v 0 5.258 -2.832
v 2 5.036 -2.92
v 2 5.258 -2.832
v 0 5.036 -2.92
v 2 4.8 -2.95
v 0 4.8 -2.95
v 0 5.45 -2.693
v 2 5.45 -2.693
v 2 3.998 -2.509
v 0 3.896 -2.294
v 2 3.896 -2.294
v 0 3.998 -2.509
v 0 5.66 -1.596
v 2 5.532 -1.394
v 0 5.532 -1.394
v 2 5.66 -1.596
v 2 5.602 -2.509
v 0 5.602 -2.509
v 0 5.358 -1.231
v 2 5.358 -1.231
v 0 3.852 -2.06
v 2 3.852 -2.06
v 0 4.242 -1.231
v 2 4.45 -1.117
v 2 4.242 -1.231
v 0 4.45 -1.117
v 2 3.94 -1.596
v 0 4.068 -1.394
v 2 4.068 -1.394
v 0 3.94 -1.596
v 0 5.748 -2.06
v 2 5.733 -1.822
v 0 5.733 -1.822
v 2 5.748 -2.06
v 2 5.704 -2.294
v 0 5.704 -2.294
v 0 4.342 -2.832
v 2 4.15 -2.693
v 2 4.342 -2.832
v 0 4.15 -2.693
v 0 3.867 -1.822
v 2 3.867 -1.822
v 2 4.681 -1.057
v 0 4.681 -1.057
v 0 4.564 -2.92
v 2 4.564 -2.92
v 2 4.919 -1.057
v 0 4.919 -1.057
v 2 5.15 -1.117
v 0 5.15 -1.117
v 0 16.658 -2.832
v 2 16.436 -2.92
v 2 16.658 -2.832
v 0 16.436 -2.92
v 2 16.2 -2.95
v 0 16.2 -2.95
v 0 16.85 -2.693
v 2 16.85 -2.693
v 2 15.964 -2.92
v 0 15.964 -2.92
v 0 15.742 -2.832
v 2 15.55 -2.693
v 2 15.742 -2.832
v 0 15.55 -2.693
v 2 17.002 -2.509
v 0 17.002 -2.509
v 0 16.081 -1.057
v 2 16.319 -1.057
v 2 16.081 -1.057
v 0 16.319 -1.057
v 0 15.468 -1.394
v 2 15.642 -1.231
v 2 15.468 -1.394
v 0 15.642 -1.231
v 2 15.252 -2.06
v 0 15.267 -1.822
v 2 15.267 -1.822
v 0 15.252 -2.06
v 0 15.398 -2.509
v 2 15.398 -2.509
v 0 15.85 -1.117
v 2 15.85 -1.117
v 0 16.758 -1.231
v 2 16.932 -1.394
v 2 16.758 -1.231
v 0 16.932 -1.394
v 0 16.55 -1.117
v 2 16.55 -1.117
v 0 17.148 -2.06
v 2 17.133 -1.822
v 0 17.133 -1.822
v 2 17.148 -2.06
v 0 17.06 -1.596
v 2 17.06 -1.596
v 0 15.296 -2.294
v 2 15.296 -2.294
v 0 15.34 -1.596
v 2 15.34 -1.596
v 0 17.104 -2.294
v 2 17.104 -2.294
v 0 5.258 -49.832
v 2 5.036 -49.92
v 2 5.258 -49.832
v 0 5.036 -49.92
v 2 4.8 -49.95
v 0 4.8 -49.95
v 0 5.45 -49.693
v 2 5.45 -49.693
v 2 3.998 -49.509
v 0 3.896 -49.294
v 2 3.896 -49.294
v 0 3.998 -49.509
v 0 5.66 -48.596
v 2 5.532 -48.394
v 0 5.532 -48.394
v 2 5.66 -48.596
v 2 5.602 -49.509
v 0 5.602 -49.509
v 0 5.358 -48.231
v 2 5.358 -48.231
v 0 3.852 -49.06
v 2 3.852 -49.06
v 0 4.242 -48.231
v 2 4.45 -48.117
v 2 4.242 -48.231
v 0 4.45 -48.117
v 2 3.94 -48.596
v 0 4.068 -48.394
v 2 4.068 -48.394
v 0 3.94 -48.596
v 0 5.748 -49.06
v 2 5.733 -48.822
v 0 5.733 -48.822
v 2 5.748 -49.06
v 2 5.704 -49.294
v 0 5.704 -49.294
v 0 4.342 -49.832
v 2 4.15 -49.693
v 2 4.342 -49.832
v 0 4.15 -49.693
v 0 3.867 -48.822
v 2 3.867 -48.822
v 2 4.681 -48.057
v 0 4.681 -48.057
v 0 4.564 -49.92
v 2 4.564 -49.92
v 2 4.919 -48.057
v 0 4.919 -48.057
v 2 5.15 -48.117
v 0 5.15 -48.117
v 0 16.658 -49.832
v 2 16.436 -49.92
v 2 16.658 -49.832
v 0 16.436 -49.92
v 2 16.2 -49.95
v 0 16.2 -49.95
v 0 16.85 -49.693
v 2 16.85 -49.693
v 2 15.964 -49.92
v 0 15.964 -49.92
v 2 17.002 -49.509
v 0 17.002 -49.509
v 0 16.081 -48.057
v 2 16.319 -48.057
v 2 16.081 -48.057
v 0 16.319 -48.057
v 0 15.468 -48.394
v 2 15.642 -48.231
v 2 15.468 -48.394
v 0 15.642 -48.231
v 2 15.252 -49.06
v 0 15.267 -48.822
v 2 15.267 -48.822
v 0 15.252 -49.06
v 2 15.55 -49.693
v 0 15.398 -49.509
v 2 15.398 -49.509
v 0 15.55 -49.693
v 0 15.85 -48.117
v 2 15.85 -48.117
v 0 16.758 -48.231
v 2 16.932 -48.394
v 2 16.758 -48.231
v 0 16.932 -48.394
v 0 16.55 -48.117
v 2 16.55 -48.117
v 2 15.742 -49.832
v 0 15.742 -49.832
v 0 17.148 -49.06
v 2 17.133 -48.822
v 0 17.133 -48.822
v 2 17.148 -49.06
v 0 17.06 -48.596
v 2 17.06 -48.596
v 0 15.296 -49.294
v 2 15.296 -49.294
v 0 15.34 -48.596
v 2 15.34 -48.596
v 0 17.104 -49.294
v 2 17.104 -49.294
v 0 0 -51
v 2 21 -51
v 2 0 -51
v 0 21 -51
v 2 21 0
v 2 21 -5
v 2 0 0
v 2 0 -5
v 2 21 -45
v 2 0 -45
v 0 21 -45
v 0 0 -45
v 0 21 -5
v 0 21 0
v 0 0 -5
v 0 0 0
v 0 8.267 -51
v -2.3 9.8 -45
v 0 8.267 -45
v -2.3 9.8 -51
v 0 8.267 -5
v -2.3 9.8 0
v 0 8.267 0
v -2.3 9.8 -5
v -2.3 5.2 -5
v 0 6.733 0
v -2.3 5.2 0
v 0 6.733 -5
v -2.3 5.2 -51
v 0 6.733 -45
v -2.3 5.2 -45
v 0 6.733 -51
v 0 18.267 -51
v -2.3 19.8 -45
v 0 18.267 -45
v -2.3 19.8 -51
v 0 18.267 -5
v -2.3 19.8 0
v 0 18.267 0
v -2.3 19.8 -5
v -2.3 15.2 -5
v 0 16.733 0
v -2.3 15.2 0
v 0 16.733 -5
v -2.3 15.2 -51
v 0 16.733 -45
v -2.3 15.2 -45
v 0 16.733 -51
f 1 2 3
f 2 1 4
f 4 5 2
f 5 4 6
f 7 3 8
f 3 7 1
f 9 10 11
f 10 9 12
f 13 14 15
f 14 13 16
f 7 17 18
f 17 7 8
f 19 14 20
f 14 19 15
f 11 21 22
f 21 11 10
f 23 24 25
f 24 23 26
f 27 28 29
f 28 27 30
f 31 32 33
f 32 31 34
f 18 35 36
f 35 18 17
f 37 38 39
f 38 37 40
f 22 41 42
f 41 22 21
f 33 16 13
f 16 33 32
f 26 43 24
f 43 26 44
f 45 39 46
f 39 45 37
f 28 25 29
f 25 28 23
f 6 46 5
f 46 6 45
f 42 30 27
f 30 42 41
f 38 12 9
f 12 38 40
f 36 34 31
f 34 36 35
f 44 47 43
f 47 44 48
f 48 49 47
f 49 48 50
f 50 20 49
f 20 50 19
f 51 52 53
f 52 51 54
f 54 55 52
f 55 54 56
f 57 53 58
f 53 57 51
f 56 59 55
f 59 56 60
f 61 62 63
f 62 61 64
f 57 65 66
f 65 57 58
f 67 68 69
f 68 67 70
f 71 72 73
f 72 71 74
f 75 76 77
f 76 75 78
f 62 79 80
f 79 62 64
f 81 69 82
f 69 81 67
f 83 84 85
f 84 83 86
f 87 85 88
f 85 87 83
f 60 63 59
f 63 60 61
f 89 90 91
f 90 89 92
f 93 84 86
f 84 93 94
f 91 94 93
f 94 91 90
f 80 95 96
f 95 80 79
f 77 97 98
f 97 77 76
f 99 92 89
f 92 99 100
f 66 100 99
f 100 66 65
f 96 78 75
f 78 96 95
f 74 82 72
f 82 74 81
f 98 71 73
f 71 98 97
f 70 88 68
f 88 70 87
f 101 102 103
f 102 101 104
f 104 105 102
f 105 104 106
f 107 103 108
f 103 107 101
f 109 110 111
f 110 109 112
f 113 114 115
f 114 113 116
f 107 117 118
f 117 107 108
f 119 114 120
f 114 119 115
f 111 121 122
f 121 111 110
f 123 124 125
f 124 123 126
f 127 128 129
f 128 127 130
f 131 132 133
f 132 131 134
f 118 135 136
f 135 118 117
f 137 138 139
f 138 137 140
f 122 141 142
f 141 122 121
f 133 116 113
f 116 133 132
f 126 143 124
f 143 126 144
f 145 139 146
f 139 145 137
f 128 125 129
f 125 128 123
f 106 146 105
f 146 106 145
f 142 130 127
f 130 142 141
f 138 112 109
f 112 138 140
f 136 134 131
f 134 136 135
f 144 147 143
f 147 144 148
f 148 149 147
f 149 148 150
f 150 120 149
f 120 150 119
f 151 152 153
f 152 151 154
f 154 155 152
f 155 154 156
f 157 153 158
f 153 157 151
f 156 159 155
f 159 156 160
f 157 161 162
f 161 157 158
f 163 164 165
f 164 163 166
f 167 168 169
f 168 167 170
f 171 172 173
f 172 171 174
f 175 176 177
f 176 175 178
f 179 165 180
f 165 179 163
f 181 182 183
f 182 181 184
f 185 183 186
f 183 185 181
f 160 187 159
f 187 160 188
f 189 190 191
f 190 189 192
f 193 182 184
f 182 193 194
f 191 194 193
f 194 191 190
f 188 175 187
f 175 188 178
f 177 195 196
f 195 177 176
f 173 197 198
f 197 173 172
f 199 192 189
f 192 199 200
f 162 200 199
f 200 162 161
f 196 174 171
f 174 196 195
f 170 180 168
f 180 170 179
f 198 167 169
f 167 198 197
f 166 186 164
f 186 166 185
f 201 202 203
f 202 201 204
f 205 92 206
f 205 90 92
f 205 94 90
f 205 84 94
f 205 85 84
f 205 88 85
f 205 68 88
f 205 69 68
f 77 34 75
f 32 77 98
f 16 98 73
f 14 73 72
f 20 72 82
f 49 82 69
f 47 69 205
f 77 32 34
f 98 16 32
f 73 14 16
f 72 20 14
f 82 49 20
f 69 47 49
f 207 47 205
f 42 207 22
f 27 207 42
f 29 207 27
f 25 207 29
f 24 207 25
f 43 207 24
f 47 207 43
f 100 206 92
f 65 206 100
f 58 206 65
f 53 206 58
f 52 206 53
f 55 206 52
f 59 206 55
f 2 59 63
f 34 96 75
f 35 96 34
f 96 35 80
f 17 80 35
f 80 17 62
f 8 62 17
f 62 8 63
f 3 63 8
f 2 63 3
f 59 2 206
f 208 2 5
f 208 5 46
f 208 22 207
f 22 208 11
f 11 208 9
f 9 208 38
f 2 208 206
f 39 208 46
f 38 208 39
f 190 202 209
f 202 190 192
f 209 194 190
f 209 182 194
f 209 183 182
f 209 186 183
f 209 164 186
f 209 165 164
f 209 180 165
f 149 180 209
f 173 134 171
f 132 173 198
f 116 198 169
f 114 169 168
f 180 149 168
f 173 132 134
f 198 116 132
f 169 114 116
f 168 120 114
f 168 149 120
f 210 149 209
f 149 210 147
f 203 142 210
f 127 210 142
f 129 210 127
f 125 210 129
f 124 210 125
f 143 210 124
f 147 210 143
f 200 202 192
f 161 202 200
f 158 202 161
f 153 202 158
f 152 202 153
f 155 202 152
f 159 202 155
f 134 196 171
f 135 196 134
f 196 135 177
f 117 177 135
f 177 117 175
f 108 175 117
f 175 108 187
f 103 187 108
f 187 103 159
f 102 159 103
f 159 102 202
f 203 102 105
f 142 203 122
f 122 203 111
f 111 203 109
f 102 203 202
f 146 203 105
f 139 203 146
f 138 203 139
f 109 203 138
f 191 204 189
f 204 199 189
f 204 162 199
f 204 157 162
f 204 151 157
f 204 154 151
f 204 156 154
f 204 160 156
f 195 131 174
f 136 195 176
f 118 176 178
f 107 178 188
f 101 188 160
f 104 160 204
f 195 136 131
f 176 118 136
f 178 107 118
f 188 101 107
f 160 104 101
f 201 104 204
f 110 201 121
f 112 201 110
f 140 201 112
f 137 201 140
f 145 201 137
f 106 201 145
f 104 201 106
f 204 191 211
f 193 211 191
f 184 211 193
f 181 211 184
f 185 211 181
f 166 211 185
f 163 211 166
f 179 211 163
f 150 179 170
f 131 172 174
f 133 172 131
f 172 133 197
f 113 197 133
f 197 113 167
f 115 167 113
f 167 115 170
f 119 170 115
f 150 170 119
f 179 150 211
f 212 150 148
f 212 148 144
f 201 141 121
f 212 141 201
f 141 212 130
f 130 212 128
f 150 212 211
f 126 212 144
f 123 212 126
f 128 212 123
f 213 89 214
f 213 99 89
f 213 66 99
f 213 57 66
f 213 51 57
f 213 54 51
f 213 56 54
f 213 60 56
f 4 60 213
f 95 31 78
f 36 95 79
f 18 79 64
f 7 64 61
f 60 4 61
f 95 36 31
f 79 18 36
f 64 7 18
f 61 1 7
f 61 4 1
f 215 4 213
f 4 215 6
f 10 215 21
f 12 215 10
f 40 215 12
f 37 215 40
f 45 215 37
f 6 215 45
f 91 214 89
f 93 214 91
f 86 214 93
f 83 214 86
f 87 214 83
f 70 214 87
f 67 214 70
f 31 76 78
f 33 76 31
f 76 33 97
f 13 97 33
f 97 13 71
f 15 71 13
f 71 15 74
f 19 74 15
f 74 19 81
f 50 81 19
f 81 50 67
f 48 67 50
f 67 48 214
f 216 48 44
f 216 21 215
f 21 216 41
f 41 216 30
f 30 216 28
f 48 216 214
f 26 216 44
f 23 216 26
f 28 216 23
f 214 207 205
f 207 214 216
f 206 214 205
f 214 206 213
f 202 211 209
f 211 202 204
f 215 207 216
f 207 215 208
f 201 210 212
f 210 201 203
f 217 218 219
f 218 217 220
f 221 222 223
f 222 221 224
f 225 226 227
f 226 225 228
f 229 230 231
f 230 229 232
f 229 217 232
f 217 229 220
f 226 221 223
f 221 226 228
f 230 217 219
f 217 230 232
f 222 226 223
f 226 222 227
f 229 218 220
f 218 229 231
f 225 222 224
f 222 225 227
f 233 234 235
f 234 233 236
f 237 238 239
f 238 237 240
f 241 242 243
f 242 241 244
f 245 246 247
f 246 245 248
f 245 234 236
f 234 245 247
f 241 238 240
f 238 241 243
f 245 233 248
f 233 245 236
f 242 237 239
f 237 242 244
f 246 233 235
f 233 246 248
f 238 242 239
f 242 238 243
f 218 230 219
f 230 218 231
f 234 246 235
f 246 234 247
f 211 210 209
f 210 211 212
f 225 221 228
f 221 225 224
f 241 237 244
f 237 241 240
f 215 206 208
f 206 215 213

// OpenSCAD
// file: board_config.scad
rail_position=20;
rail_height=2.5;
rail_width=5;
mainboard_width=60;
mainboard_height=130;
mainboard_thickness=4;
mainboard_spacing=10;
deep_holes_spacing=10;
rails=4;


board_attacher_width=4;
board_attacher_height=55;
board_attacher_length=30;

side_panel_height = board_attacher_height + 2*mainboard_thickness;
side_panel_thickness=2;
side_panel_ticks=2;

front_panel_height = board_attacher_height + 2*mainboard_thickness;
front_panel_thickness=2;
front_panel_ticks=2;
front_panel_width = mainboard_height + 2*side_panel_thickness;
// file: dovetail.scad
module dovetail_shape(width, height, length) {
    translate([-width/2,0,0]) linear_extrude(height = length) {
        polygon([[0, 0], [width, 0], [width - width/3, height], [width/3, height]]);
    }
}

module rail(male=false, width, height, length, default_offset=0.2) {
    // male will reduce the width slightly
    offset = male ? default_offset : 0;
    
    translate([0,0,-height+offset]) rotate([90,0,0]) dovetail_shape(width-2*offset,height-offset,length);
}
// file: generic_board.scad
include <dovetail.scad>;
include <board_config.scad>;
include <common.scad>;


hole_spacing=10;
front_back_holes_depth=10;

module generic_board_attacher_mating() {
    difference() {
        cube([board_attacher_width,board_attacher_length,board_attacher_height]);
        // non attaching holes
        
        for (z=[1:board_attacher_height/(hole_spacing/2)-1]) translate([0,0,hole_spacing/2*z]) union() {
            /*for (i=[1:board_attacher_length/hole_spacing-1]) 
                translate([-margin,hole_spacing*i,0]) rotate([0,90,0]) 
                    cylinder(board_attacher_width+2*margin,d=bigscrew_diameter, $fn=50);*/
            for (i=[1:board_attacher_length/(hole_spacing/2)]) 
                translate([-margin,hole_spacing*i/2-hole_spacing/4,0]) rotate([0,90,0]) 
                    cylinder(board_attacher_width+2*margin,d=bigscrew_attach_hole_diameter, $fn=50);                
        }
        // vertical attaching holes
        for (i=[1:board_attacher_height/(hole_spacing/2)-1]) 
            union() {
                translate([board_attacher_width/2,front_back_holes_depth+margin,hole_spacing*i/2]) rotate([90,00,0]) 
                    cylinder(front_back_holes_depth+2*margin,d=bigscrew_attach_hole_diameter, $fn=50);             
                translate([board_attacher_width/2,board_attacher_length+margin,hole_spacing*i/2]) rotate([90,00,0]) 
                    cylinder(front_back_holes_depth+2*margin,d=bigscrew_attach_hole_diameter, $fn=50);             
            }
                
    }
}

module generic_board_attacher() {
    union() {
        generic_board_attacher_mating();
        translate([board_attacher_width/2,board_attacher_length,0]) rail(true, rail_width, rail_height, board_attacher_length);  
        translate([board_attacher_width/2,board_attacher_length,board_attacher_height]) rotate([0,180,0]) rail(true, rail_width, rail_height, board_attacher_length);  
    }
}

//generic_board_attacher();
// file: pico.scad
include <pico_config.scad>;

module pico_holes_block(diameter, margin, extra_up,thickness) {
    $fn=50;
    for(i=[0:3])
        translate([pico_holes[i][0],pico_holes[i][1],-margin/2]) 
            cylinder(h=thickness+margin+extra_up, d=diameter);
}


module pico() {
    difference() {
        union() {
            color("green") cube([pico_width,pico_height,pico_thickness]);
            color("grey") translate([-usb_protrude,(pico_height-usb_height)/2,pico_thickness]) cube([usb_width, usb_height, usb_thickness]);
        }
        pico_holes_block(pico_screw_hole, margin,1,pico_thickness);
    }
}

pico();
// file: pico_config.scad
pico_width = 51;
pico_height=21;
pico_thickness=2;
pico_screw_from_width=2;
pico_screw_from_height=4.8;
margin=0.1;
pico_screw_hole=2.1;
usb_height=8;
usb_protrude=1.3;
usb_width=5.5;
usb_thickness=2.3;

pico_holes=[
    [pico_screw_from_width, pico_screw_from_height],
    [pico_screw_from_width, pico_height-pico_screw_from_height],
    [pico_width-pico_screw_from_width,pico_screw_from_height],
    [pico_width-pico_screw_from_width,pico_height-pico_screw_from_height]
];
// file: common.scad
inch_to_mm = 25.4;

margin=0.1;
bigscrew_attach_hole_diameter= 2.44;
bigscrew_diameter = 2.54;
bigscrew_head_diameter = 5;
bigscrew_head_height = 2.1;
// main file
include <common.scad>
include <pico_config.scad>
use <pico.scad>


include <generic_board.scad>

support_pico_thickness=2;
support_pico_length=51;

module support_pico_full(ghost=false) {
    $fn=25;
    
    difference() {
        cube([support_pico_length,21,support_pico_thickness]);
        for(i=[0:3])
        translate([pico_holes[i][0],pico_holes[i][1],-margin/2]) 
            cylinder(h=10, d=1.9);
    }
    translate([0,7.5,0]) rotate([0,0,90]) rail(true, rail_width, rail_height, support_pico_length); 
    translate([0,17.5,0]) rotate([0,0,90]) rail(true, rail_width, rail_height, support_pico_length);
}

module support_pico(ghost=false) {
    if (ghost) {
        translate([0,0,support_pico_thickness]) rotate([0,0,0]) pico();
    }
    difference() {
        support_pico_full(ghost);
        translate([5,-5,-5]) cube([40,40,20]);
    }
}

rotate([0,90,0]) support_pico(false);
